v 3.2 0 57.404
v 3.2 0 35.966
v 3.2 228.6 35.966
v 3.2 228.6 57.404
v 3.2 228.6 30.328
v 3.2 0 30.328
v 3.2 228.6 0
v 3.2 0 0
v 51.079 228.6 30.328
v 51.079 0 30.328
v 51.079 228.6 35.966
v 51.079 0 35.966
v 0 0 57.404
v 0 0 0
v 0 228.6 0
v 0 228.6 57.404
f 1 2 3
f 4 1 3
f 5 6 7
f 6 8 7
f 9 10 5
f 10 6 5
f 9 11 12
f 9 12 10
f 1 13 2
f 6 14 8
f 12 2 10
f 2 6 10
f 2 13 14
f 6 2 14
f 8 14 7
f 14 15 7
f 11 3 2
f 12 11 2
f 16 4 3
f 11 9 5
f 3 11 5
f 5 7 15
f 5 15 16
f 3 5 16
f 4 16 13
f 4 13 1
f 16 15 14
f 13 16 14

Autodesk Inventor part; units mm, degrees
ref_plane "YZ Plane" through (0, 0, 0) normal (1, 0, 0) x (0, 1, 0)
ref_plane "XZ Plane" through (0, 0, 0) normal (0, 1, 0) x (-1, 0, 0)
ref_plane "XY Plane" through (0, 0, 0) normal (0, 0, 1) x (1, 0, 0)
sketch "Sketch1" plane through (0, 0, 0) normal (0, 0, 1) x (1, 0, 0)
  line L0 (0, 0) -> (3.2004, 0)
  line L1 (3.2004, 0) -> (3.2004, 228.6)
  line L2 (3.2004, 228.6) -> (0, 228.6)
  line L3 (0, 228.6) -> (0, 0)
  dimension "d0" = 3.2004
  dimension "d1" = 228.6
extrude "Extrusion1" add sketch "Sketch1" along normal blind 57.404
sketch "Sketch2" plane through (3.2004, 0, 0) normal (1, 0, 0) x (0, 0, -1)
  line L0 (0, 0) -> (-57.404, 0) projected
  line L1 (0, 228.6) -> (-57.404, 228.6) projected
  line L2 (-35.9664, 0) -> (-30.3276, 0)
  line L3 (-30.3276, 0) -> (-30.3276, 228.6)
  line L4 (-30.3276, 228.6) -> (-35.9664, 228.6)
  line L5 (-35.9664, 228.6) -> (-35.9664, 0)
  line L6 (-57.404, 0) -> (-57.404, 228.6) projected
  dimension "d4" = 228.6
  dimension "d5" = 5.6388
  dimension "d6" = 21.4376
extrude "Extrusion2" add sketch "Sketch2" along normal blind 47.879 contours L0 L5 L1 L3
properties part number "Guide 2"
